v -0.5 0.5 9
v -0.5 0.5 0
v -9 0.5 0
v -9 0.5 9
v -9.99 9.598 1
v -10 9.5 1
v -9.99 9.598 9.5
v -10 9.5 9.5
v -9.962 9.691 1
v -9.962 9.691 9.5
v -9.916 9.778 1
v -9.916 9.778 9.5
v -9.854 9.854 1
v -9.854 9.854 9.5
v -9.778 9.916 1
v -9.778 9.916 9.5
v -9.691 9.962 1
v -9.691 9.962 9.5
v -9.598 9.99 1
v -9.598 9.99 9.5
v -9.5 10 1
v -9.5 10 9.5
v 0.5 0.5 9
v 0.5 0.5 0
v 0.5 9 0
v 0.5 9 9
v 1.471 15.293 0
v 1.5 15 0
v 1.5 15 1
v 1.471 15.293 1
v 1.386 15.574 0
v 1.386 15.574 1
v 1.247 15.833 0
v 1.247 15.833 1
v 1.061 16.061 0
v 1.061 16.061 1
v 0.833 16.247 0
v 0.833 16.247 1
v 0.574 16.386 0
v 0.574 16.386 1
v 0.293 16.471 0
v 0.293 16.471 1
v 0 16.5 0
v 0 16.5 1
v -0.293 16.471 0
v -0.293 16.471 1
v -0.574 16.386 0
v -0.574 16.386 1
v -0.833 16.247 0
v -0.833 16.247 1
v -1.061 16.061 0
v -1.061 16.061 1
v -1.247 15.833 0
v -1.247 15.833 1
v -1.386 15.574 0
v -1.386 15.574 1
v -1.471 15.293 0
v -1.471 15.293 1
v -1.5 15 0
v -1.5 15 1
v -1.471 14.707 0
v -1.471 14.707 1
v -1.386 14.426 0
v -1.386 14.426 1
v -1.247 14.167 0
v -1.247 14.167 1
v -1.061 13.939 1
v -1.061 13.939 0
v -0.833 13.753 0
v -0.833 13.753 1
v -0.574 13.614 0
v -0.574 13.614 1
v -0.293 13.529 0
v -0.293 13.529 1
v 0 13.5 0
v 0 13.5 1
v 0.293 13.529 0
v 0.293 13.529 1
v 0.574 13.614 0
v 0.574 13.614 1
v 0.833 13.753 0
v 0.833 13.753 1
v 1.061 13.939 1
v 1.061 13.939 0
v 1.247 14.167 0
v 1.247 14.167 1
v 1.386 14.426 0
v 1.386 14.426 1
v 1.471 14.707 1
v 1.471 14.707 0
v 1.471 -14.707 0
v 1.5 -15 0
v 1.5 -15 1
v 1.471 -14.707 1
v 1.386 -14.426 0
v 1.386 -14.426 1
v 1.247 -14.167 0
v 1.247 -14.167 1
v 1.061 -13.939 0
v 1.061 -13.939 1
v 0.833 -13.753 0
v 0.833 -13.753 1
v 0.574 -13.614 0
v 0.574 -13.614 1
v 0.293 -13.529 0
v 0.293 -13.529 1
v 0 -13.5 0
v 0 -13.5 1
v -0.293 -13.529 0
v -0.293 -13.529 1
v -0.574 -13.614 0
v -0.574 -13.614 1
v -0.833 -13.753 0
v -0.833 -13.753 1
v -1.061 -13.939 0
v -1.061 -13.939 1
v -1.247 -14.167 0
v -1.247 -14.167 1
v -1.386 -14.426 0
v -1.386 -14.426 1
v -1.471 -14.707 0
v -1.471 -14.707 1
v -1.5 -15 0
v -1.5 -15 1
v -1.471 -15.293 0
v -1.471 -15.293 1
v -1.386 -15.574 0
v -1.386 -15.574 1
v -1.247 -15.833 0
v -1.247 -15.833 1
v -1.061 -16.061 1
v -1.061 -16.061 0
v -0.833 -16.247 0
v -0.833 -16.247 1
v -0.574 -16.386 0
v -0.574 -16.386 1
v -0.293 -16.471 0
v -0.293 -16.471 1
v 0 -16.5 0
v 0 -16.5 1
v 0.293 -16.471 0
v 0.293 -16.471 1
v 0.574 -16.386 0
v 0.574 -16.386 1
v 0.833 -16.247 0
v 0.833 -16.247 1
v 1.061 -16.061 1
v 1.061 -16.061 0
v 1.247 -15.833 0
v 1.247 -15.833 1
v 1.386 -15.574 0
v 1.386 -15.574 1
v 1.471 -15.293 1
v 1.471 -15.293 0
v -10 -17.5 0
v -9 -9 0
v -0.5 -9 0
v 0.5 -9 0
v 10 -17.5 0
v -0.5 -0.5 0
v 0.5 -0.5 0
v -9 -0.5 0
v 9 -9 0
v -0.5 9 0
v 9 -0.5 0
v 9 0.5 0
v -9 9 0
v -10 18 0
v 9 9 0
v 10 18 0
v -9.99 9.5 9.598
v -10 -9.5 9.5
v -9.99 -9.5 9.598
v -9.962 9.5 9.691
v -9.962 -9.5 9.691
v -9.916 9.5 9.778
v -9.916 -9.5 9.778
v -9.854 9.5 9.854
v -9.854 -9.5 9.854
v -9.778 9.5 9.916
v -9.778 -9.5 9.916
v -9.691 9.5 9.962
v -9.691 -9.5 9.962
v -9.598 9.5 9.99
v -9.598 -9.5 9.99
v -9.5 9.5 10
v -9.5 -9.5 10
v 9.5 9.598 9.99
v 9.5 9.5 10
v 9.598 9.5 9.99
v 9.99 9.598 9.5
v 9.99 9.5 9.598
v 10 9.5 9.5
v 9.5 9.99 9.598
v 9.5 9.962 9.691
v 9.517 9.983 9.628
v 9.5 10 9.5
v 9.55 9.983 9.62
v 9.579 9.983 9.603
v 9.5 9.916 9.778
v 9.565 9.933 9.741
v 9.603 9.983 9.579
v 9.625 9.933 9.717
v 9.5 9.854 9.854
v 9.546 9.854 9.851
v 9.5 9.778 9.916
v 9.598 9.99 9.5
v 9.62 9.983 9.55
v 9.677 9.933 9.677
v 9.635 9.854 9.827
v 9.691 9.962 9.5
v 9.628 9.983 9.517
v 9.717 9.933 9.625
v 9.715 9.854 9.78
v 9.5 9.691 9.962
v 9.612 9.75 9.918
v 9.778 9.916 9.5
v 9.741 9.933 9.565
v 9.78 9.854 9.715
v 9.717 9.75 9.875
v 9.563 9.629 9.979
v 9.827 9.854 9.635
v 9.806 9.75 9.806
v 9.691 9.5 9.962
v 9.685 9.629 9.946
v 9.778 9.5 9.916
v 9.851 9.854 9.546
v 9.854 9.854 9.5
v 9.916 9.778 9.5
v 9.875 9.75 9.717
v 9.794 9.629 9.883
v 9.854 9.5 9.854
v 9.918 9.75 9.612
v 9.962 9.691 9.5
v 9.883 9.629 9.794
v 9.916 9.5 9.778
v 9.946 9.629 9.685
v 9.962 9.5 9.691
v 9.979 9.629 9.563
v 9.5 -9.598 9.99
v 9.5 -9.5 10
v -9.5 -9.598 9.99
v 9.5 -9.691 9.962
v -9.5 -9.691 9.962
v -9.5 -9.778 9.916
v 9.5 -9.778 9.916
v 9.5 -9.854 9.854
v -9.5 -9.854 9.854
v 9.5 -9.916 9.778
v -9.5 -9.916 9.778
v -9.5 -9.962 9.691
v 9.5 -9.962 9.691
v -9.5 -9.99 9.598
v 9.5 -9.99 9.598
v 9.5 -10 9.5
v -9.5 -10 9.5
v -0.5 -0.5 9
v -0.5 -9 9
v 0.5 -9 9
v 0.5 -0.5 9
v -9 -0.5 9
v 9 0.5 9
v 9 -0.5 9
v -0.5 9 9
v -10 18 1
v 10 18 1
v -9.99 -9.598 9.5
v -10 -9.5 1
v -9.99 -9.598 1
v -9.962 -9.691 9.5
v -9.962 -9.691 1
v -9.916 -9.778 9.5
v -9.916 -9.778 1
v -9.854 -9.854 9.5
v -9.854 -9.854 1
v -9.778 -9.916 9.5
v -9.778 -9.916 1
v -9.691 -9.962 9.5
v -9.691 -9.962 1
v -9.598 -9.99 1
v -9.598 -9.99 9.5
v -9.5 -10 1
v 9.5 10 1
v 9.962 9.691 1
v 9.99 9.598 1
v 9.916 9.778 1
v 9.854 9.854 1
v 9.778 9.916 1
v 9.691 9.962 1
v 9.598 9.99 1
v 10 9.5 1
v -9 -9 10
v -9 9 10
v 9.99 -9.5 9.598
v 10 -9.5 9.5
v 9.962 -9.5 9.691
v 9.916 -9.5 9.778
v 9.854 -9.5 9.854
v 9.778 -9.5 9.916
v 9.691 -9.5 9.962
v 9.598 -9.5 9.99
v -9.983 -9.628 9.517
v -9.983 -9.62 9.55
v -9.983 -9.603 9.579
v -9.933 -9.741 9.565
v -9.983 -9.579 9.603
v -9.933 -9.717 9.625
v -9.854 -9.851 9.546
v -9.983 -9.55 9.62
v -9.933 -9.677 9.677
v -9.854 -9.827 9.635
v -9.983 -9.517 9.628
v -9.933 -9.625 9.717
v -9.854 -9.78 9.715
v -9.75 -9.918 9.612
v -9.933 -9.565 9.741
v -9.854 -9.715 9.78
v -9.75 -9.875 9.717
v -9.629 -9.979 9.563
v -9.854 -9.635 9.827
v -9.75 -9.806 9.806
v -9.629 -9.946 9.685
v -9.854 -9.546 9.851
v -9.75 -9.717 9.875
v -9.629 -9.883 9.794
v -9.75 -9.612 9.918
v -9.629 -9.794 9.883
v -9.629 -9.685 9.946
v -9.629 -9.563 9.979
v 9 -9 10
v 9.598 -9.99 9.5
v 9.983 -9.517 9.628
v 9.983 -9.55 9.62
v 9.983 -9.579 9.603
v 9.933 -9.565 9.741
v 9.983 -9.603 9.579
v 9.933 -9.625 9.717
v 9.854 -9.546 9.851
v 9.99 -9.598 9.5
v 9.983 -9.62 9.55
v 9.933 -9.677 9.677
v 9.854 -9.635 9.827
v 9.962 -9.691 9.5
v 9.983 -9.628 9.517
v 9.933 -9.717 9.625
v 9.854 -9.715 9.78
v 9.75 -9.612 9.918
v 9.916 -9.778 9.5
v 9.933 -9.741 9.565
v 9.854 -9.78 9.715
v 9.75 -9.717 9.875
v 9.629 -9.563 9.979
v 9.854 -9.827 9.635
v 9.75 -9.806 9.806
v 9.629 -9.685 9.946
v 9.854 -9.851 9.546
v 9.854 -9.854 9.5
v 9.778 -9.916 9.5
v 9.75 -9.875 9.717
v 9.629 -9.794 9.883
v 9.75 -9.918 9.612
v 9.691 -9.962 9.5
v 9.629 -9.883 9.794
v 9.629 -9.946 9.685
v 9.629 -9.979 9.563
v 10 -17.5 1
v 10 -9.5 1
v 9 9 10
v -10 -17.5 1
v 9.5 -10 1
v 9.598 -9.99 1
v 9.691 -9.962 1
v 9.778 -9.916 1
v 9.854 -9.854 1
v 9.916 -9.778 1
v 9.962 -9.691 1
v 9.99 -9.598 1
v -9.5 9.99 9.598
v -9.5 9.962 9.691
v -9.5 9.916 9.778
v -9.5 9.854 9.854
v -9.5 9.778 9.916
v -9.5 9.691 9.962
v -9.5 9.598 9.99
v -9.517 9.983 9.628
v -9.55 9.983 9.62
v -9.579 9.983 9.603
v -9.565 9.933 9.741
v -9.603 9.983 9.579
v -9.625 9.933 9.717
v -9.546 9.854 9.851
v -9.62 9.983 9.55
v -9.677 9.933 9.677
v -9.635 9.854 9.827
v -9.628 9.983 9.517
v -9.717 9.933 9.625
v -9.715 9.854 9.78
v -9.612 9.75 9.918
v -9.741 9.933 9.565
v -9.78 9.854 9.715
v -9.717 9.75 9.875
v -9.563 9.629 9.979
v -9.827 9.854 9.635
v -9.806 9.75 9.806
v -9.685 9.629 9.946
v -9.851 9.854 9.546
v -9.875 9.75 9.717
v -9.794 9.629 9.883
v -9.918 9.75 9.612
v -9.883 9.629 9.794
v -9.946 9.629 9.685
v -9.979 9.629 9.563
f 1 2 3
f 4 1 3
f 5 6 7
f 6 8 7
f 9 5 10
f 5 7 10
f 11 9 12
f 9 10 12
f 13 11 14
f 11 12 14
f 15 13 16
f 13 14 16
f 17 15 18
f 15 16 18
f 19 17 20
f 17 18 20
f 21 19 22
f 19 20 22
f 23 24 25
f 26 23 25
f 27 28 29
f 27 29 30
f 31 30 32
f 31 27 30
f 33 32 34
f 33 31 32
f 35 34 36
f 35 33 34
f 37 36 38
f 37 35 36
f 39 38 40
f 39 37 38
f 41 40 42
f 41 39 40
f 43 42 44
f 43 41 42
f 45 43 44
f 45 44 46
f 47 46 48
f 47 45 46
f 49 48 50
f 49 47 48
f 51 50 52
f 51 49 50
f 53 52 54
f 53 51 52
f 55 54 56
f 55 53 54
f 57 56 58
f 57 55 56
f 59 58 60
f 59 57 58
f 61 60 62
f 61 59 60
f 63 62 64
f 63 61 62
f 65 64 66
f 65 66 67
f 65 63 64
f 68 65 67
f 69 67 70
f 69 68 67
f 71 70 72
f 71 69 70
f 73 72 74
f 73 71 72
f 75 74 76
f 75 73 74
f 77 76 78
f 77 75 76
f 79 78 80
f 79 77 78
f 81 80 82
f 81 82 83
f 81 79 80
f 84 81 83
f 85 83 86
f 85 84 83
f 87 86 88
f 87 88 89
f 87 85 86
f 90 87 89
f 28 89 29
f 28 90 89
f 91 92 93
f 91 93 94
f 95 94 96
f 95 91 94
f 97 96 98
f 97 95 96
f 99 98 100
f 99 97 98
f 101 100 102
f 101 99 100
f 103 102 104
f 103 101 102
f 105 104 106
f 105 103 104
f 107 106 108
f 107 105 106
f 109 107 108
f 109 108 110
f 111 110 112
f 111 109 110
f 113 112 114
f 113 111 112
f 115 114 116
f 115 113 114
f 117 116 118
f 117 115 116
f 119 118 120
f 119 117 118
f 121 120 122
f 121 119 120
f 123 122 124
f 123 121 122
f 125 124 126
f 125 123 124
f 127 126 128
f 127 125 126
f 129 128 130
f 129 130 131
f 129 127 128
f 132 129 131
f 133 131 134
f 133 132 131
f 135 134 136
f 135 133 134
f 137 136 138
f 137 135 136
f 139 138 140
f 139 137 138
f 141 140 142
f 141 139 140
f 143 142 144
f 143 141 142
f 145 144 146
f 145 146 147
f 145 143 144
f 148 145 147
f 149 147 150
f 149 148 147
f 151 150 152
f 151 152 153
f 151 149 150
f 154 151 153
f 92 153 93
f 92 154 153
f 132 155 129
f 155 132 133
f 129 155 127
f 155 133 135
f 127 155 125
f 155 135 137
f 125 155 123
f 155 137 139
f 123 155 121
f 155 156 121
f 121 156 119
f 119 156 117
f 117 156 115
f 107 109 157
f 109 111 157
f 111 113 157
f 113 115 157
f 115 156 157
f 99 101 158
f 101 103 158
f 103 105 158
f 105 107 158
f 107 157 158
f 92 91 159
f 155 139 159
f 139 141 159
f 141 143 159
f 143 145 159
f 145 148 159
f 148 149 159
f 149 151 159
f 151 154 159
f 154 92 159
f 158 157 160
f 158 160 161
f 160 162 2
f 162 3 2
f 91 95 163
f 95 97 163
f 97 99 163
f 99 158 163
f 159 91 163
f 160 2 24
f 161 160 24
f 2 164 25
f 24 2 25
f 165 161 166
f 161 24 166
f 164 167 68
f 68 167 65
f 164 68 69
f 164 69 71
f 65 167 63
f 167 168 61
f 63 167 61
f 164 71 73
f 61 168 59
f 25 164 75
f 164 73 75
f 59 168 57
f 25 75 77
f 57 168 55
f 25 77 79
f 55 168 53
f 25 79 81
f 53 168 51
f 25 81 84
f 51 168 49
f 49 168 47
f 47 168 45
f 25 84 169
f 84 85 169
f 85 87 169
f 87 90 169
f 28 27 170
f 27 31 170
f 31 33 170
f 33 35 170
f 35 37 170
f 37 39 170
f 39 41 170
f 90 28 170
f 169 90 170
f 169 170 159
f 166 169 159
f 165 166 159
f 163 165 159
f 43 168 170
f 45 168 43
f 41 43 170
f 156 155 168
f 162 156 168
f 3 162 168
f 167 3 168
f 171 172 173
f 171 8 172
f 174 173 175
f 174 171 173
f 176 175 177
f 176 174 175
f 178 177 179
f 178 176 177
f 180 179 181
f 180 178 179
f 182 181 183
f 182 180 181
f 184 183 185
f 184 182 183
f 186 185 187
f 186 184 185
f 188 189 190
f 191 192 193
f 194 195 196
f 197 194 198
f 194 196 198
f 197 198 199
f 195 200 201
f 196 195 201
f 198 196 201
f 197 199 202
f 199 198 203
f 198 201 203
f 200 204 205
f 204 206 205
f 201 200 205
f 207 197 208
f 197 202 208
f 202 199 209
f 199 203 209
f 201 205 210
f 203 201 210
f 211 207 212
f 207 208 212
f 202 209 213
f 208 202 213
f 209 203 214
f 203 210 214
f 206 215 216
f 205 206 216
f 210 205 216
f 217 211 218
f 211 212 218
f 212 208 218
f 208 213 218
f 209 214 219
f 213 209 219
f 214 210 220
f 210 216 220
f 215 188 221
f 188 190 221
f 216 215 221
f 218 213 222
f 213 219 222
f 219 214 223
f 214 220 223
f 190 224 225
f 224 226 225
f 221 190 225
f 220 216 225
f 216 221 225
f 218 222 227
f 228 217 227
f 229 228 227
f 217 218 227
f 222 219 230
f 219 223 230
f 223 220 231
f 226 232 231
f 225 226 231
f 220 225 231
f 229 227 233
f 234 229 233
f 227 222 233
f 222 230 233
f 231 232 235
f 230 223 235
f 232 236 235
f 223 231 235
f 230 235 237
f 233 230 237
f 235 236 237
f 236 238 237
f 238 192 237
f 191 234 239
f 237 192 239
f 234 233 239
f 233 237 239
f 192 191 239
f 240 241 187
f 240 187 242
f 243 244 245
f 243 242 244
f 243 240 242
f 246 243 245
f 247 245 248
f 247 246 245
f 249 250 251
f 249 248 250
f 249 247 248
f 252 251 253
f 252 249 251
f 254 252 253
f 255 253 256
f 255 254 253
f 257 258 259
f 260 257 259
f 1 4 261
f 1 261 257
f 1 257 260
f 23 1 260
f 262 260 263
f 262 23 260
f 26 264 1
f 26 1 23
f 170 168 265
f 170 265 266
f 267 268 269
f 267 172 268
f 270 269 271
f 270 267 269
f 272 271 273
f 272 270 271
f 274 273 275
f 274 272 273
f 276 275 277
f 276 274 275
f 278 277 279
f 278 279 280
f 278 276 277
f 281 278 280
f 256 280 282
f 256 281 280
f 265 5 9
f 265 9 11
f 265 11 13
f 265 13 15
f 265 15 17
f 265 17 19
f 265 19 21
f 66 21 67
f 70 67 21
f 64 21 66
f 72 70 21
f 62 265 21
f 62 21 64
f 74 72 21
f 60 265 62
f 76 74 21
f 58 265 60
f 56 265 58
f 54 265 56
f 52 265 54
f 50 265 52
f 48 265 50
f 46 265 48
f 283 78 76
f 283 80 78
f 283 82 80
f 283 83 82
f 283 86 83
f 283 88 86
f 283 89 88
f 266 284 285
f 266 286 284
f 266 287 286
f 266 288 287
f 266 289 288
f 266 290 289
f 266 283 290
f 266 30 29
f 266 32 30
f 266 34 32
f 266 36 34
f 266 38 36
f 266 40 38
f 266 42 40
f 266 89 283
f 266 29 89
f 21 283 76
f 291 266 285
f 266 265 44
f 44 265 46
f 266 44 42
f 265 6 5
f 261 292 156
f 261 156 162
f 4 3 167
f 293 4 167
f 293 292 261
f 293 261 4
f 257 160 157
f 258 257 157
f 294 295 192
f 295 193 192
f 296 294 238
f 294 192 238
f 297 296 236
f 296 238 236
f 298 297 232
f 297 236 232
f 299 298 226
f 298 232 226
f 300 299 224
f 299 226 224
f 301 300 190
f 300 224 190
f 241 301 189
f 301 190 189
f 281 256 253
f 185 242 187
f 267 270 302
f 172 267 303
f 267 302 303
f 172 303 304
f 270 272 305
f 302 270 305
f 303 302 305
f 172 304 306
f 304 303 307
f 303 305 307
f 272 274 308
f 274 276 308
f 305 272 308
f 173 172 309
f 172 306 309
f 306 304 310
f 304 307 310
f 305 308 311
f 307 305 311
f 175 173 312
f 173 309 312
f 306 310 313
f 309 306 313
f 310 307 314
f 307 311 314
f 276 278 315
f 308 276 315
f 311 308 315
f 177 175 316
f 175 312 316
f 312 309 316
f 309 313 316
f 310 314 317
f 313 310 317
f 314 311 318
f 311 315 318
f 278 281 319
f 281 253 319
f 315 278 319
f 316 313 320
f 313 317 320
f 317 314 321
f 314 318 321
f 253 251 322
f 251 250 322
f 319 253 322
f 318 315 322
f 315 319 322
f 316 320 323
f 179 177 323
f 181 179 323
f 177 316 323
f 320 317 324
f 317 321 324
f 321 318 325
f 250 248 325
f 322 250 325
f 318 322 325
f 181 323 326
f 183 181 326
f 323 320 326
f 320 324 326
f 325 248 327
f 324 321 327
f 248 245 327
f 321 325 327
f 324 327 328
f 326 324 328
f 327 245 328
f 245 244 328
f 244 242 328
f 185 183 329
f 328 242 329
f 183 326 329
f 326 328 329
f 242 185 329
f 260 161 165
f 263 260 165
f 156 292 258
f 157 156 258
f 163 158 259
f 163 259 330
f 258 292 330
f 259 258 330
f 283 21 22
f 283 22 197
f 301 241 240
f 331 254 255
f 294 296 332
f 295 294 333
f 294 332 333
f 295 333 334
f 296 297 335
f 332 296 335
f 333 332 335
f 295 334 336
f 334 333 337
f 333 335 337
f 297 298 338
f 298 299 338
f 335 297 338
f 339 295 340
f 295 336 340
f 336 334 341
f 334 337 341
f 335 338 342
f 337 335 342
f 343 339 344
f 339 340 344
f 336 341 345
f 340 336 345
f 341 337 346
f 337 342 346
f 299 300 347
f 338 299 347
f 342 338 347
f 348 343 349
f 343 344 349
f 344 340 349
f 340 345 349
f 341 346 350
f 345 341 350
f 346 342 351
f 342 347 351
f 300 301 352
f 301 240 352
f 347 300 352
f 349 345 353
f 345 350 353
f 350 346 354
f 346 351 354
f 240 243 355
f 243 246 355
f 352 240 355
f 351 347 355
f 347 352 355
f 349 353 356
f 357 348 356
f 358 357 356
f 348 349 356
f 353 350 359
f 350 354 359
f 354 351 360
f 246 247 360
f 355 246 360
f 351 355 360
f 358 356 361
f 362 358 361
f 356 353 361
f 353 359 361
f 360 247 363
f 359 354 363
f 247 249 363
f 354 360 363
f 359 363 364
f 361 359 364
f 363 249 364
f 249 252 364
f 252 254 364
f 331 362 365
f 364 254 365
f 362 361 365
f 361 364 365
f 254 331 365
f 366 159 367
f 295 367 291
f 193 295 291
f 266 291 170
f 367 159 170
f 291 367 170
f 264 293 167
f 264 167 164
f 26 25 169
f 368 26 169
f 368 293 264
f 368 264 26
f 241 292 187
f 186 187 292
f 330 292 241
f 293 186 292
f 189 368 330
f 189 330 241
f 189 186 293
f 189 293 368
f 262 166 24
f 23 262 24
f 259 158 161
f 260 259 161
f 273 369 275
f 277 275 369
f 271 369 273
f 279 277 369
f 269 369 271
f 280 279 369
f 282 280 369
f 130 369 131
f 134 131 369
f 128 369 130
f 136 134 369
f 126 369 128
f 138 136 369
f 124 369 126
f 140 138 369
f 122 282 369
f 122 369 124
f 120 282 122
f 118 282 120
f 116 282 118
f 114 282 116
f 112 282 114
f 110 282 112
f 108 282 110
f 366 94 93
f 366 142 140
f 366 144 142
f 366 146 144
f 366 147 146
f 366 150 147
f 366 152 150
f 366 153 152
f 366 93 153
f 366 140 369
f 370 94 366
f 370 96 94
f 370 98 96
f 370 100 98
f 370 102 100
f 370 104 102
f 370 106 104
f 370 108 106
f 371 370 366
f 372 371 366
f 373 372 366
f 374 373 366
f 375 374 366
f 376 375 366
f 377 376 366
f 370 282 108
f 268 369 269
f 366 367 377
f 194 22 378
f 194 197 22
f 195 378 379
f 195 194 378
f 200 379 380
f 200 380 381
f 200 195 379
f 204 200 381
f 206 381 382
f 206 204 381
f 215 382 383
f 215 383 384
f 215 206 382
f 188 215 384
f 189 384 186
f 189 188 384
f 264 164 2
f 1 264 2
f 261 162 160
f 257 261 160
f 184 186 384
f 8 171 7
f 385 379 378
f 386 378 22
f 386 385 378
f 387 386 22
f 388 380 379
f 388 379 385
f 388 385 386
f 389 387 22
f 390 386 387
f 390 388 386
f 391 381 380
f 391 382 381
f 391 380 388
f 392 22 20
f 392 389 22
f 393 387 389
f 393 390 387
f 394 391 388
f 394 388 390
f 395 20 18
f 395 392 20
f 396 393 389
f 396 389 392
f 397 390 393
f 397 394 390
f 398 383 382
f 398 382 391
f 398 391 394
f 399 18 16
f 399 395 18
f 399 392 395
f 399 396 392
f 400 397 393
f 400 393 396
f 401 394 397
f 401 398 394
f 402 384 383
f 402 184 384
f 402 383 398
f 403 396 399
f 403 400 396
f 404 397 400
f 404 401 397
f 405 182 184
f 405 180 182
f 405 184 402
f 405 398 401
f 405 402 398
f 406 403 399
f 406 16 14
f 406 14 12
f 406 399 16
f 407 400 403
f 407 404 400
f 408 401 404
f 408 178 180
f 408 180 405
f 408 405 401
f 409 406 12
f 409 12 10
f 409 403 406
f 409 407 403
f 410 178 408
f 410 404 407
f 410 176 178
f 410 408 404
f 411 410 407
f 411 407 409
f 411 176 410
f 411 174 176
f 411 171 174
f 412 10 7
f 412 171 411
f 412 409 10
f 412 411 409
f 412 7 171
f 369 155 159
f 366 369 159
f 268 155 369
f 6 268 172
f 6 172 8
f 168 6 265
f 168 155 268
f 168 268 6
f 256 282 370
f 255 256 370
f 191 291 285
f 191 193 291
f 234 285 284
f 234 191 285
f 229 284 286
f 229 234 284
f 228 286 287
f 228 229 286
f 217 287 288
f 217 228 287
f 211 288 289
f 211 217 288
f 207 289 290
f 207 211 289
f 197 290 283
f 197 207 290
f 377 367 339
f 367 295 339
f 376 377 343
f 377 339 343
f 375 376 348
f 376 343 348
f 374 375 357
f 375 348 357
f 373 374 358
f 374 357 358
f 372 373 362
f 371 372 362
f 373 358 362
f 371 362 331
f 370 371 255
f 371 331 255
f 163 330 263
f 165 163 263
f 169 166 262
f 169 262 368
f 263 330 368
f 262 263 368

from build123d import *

# Parameters (mm, degrees)
F0_W     = 20
F0_H     = 20
F1_DEPTH = 10
F2_T     = -1
F4_DEPTH = 9
F5_W     = 20
F5_H     = 8
F5_R     = 1.5
F6_DEPTH = 1
F7_W     = 18
F7_H     = 18
F8_DEPTH = 1
F9_R     = 0.5


with BuildPart() as f1:
    # F0 (on Top) → F1 (new body)
    with BuildSketch(Plane.XY):
        Rectangle(F0_W, F0_H)
    extrude(amount=F1_DEPTH)

    # F2
    f2_openings = [f1.faces().sort_by_distance(p)[0] for p in [
        (0, 0, 0),
    ]]
    offset(amount=F2_T, openings=f2_openings)

    # F3 (on Top) → F4 (join)
    with BuildSketch(Plane.XY):
        Polygon((-0.5, -9), (0.5, -9), (0.5, -0.5), (9, -0.5), (9, 0.5), (0.5, 0.5), (0.5, 9), (-0.5, 9), (-0.5, 0.5), (-9, 0.5), (-9, -0.5), (-0.5, -0.5), align=None)
    extrude(amount=F4_DEPTH)

    # F5 (on Top) → F6 (join)
    with BuildSketch(Plane.XY):
        with Locations((0, -13.5)):
            Rectangle(F5_W, F5_H)
        with Locations((0, -15)):
            Circle(F5_R, mode=Mode.SUBTRACT)
        with Locations((0, 14)):
            Rectangle(F5_W, F5_H)
        with Locations((0, 15)):
            Circle(F5_R, mode=Mode.SUBTRACT)
    extrude(amount=F6_DEPTH)

    # F7 (on face) → F8 (cut)
    with BuildSketch(Plane.XY.offset(10)):
        Rectangle(F7_W, F7_H)
    extrude(amount=-F8_DEPTH, mode=Mode.SUBTRACT)

    # F9
    f9_edges = [f1.edges().sort_by_distance(p)[0] for p in [
        (0, -10, 10),
        (10, 0, 10),
        (10, -10, 5.5),
        (-10, -10, 5.5),
        (-10, 0, 10),
        (0, 10, 10),
        (10, 10, 5.5),
        (-10, 10, 5.5),
    ]]
    fillet(f9_edges, radius=F9_R)


solid = f1.part
